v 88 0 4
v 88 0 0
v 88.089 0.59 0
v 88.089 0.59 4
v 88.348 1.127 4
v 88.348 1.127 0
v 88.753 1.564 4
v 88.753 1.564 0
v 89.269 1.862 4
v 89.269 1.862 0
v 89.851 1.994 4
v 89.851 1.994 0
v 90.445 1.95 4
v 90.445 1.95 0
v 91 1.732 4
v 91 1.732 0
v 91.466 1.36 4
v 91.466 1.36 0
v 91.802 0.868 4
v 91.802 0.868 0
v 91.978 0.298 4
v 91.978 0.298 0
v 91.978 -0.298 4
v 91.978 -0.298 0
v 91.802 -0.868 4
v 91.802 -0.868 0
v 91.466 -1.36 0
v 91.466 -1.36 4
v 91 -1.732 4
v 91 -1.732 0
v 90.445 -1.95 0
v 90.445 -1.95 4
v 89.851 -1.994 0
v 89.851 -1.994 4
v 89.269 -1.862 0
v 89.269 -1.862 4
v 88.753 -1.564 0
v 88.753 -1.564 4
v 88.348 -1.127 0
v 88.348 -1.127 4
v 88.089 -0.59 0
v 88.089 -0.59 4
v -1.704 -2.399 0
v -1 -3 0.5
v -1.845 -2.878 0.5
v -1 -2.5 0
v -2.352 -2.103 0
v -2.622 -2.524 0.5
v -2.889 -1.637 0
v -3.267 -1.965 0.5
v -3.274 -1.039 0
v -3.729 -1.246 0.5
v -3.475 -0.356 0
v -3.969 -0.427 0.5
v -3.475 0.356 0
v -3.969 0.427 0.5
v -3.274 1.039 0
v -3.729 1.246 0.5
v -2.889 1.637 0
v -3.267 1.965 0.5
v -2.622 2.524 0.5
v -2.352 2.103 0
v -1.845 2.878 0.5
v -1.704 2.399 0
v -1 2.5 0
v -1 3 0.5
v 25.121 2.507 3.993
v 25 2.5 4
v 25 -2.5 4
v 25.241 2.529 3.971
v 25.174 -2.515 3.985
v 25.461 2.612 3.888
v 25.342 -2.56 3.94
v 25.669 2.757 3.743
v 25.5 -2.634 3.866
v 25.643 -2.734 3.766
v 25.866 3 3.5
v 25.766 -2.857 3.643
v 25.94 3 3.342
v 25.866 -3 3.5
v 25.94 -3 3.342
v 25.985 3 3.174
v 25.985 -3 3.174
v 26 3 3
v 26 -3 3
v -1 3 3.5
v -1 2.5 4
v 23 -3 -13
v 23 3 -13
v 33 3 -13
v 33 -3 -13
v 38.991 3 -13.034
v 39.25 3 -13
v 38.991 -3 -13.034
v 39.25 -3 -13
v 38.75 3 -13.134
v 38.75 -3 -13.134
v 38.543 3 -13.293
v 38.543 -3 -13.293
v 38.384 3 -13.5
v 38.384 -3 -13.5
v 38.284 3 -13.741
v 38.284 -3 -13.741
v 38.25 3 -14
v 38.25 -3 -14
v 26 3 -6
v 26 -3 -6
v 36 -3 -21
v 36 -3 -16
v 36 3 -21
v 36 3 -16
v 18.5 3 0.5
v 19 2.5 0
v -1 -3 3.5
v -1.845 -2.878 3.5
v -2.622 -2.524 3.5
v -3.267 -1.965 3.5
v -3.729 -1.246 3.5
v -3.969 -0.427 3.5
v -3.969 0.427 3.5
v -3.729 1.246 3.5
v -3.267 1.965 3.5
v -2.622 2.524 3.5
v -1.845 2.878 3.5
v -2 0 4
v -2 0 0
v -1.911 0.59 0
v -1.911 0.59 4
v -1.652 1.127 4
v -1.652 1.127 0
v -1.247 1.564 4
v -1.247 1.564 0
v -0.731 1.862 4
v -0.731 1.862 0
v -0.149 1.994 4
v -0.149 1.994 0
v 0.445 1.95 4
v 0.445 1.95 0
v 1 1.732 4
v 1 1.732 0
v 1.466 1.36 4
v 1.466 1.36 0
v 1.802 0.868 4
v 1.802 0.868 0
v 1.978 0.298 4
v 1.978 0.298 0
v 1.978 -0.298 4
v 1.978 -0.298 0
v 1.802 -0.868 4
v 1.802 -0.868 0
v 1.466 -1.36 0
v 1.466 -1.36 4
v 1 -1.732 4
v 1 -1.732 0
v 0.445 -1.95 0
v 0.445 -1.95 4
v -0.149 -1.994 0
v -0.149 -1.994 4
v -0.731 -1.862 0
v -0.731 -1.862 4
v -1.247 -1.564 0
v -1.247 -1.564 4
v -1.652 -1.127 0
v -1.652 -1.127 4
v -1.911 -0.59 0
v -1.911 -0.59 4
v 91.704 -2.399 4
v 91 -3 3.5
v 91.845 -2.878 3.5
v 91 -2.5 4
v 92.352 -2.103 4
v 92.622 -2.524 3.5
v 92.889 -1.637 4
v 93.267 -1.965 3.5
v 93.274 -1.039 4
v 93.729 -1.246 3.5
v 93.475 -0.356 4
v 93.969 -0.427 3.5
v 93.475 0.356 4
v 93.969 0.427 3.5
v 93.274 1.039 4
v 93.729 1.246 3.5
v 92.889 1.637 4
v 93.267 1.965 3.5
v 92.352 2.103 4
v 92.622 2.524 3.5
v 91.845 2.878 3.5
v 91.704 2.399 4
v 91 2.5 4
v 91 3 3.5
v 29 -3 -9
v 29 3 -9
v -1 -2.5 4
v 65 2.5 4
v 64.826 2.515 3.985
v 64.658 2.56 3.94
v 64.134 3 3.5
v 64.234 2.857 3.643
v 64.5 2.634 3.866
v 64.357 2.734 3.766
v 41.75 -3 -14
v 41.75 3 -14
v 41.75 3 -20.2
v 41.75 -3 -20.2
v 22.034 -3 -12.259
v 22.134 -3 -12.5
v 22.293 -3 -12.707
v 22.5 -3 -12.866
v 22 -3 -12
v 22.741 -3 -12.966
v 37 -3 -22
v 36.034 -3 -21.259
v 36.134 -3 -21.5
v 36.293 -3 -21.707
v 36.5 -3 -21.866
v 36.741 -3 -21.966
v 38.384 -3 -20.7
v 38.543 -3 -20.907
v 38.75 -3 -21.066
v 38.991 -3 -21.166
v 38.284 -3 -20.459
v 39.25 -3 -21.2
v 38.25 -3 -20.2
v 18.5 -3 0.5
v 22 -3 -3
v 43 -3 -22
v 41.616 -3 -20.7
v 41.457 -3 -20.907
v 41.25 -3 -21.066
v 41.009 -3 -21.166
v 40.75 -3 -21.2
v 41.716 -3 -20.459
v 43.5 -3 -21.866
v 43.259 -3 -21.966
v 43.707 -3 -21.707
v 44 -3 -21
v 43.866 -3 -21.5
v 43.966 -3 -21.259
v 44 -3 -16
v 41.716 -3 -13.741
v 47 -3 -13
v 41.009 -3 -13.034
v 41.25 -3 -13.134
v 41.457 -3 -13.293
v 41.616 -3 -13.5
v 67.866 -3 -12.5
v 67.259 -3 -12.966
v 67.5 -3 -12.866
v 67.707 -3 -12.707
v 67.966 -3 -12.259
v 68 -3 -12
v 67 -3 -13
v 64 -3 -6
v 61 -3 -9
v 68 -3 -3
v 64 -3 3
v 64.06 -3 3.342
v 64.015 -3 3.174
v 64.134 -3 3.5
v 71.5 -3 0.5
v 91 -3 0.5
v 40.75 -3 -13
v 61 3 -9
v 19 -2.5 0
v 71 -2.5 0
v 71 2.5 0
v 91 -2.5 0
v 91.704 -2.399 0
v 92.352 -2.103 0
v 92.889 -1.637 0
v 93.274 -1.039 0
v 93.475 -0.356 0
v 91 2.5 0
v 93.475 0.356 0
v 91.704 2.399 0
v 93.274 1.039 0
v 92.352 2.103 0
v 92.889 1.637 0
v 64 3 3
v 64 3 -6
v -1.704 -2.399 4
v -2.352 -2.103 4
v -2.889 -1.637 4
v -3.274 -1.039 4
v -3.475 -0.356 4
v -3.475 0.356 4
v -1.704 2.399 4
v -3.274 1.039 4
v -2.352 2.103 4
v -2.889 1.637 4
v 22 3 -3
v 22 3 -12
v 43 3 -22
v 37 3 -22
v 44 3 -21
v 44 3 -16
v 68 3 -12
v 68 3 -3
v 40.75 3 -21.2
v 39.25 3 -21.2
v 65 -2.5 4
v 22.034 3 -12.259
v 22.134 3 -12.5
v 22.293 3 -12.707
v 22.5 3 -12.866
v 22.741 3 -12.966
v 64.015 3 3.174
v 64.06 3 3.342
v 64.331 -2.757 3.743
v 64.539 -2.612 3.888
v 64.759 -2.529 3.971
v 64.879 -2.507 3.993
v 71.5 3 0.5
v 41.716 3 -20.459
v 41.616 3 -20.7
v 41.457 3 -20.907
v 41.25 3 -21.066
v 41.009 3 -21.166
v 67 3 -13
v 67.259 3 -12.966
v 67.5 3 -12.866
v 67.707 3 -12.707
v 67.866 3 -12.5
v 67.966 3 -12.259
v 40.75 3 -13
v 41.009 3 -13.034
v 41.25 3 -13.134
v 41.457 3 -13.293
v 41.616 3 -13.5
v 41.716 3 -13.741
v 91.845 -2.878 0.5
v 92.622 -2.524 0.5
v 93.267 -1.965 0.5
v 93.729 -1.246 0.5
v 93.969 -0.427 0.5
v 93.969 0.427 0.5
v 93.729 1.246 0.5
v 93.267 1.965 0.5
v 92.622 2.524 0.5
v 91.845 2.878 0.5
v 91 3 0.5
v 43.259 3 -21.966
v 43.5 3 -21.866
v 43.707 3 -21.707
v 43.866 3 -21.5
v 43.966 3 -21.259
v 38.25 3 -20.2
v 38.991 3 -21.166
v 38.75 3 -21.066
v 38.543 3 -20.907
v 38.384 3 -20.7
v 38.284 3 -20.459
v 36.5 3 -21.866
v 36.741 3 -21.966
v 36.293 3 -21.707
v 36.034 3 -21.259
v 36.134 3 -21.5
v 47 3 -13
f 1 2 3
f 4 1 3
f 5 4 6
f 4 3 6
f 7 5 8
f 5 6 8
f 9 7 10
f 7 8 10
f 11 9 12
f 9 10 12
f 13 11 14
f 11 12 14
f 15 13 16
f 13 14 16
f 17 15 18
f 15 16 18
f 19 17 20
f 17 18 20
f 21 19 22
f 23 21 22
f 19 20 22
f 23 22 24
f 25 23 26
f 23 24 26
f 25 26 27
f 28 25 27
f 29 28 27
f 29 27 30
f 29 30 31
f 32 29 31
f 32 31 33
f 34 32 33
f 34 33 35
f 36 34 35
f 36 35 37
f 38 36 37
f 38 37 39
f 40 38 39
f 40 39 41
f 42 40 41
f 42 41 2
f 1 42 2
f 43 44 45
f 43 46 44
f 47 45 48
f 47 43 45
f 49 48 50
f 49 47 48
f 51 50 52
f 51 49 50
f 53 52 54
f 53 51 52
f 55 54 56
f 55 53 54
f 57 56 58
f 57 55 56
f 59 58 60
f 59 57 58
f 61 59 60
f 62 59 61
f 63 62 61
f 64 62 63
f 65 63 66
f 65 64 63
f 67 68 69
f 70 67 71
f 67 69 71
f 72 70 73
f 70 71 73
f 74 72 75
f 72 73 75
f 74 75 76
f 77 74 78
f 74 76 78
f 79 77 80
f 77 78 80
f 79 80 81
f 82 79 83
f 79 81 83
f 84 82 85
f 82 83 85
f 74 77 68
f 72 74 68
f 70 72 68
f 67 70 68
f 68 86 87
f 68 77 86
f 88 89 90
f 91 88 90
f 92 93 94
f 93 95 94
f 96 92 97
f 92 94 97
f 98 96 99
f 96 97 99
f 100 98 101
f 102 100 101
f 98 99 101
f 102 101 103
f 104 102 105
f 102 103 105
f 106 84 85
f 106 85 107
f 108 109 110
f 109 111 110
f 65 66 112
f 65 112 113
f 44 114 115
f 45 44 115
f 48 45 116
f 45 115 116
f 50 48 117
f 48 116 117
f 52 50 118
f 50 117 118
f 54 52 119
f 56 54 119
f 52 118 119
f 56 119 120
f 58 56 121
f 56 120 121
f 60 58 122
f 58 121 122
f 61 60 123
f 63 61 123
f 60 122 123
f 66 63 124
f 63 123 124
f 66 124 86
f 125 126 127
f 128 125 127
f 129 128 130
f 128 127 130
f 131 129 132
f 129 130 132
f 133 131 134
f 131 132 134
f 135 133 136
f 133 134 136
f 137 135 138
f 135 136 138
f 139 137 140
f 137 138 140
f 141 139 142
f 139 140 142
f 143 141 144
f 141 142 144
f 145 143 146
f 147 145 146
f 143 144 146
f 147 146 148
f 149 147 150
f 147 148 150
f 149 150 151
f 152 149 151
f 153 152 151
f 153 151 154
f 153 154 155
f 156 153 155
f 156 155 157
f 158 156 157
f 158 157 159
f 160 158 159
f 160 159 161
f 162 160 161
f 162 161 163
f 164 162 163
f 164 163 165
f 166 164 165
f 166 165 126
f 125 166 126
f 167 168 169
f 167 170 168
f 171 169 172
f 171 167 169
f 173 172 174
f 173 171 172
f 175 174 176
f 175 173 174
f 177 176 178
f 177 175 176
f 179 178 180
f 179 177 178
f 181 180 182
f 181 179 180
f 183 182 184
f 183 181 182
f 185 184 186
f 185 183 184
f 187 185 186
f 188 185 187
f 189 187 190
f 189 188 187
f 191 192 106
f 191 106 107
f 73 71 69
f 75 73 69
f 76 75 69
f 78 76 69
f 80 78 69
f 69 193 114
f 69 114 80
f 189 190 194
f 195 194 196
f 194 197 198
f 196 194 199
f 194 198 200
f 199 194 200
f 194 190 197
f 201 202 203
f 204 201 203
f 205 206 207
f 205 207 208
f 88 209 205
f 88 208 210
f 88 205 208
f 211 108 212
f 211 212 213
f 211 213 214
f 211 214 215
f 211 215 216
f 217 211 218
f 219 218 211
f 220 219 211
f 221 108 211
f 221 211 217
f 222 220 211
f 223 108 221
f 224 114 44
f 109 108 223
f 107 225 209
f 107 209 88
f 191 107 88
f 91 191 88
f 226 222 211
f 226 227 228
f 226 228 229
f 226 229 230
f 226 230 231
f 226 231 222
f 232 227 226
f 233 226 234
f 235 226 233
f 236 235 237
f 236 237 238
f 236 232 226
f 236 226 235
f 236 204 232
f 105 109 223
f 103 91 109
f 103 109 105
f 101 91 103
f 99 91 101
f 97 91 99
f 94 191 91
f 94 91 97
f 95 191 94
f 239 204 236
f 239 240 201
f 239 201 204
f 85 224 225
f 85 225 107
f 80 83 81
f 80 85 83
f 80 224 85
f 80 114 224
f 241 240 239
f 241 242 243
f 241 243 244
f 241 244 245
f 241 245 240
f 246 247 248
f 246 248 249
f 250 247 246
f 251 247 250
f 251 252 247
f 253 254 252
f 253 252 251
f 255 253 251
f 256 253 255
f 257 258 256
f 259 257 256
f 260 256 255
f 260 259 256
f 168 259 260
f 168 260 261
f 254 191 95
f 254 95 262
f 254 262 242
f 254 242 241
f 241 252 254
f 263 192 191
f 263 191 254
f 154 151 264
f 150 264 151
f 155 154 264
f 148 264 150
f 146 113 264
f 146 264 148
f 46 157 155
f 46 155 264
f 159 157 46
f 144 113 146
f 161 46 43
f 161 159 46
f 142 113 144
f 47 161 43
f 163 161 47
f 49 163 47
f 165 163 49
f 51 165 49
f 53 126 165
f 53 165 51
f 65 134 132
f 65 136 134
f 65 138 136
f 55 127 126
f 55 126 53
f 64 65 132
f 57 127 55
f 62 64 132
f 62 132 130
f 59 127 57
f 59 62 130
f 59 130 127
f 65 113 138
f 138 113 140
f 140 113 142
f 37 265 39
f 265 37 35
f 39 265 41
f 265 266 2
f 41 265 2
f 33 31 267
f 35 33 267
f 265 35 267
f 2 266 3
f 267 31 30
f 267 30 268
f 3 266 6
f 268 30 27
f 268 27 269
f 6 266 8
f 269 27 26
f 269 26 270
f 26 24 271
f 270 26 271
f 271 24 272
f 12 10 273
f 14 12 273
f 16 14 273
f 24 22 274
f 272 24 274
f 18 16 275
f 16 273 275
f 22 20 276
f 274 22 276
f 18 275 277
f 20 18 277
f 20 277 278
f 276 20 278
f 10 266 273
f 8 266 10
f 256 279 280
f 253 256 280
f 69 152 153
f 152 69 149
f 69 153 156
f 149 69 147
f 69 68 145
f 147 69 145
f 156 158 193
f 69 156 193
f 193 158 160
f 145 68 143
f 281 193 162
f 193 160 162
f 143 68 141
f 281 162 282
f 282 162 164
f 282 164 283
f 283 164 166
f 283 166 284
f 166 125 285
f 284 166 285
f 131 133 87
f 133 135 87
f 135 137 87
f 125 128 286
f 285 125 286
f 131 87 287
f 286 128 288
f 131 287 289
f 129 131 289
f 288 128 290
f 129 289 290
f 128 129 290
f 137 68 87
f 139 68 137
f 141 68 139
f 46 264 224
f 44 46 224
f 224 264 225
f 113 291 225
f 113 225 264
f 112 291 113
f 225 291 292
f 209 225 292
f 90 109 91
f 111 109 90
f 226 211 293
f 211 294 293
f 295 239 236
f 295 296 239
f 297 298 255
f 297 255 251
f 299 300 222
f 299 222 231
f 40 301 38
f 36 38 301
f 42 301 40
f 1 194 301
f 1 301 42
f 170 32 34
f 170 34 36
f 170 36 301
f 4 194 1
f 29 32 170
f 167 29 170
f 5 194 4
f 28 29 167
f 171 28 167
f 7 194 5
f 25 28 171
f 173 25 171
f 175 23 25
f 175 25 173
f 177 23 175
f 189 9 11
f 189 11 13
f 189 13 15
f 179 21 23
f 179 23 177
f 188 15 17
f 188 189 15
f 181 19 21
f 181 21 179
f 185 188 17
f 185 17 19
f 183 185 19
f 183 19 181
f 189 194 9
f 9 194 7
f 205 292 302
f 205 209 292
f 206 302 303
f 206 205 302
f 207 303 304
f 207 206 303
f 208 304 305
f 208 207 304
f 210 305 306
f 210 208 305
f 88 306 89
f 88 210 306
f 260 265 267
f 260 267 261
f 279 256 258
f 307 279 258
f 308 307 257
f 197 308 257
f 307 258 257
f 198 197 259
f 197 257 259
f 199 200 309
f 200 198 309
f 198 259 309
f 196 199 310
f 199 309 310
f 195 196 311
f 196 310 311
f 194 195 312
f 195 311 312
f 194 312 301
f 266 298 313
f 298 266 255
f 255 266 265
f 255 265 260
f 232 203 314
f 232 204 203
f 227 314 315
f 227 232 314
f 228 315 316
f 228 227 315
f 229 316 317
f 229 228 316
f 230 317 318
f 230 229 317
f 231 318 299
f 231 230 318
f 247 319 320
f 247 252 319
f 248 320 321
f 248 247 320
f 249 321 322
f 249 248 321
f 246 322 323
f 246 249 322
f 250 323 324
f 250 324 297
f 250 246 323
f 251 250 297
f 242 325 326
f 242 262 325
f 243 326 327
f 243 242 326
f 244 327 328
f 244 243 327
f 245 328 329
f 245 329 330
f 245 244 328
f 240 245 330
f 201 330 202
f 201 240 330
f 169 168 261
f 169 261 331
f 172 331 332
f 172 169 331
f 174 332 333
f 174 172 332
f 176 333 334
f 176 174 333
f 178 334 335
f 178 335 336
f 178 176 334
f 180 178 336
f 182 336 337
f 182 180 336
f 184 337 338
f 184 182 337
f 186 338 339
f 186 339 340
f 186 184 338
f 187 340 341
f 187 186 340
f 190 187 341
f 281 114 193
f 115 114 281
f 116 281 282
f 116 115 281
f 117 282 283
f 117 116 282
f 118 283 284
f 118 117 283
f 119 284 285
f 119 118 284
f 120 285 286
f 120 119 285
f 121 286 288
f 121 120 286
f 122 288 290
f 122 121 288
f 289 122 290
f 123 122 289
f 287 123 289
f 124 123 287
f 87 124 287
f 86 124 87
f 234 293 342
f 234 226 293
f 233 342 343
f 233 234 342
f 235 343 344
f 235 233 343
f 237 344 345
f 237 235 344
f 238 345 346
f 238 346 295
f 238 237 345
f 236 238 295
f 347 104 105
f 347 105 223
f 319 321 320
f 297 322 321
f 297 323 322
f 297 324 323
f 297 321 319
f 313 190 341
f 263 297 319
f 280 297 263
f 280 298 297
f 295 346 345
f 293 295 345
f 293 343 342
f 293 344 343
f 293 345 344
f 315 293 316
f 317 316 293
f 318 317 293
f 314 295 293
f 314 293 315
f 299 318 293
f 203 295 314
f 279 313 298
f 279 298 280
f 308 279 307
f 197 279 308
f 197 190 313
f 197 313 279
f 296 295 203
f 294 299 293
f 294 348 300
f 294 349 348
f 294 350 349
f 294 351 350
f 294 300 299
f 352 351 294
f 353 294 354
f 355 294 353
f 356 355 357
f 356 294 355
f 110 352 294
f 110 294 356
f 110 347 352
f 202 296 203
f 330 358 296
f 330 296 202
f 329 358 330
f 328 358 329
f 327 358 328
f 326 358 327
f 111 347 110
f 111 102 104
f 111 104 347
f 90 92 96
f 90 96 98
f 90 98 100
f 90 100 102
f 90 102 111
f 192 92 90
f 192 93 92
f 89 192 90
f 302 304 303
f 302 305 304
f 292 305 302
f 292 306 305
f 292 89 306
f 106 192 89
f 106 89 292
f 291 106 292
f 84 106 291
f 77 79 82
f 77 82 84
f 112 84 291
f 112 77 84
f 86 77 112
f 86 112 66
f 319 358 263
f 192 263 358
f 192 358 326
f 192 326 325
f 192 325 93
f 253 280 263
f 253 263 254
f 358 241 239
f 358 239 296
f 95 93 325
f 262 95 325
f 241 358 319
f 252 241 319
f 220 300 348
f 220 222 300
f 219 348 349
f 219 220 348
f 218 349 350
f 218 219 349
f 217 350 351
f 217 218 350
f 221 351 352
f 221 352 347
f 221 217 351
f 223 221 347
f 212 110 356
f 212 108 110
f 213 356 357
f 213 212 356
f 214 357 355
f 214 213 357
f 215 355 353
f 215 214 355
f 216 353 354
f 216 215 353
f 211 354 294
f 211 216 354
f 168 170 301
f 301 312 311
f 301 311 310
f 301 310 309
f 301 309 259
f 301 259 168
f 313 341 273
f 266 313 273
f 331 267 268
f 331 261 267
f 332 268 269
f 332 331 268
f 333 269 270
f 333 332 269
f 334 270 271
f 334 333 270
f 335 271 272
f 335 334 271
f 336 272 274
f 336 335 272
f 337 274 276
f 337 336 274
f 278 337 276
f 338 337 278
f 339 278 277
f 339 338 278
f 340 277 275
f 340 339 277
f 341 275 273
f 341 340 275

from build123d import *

# Parameters (mm, degrees)
CROQUIS1_R                = 3
SALIENTE_EXTRUIR1_DEPTH   = 4
SALIENTE_EXTRUIR1_2_DEPTH = 4
CROQUIS2_W                = 90
CROQUIS2_H                = 6
SALIENTE_EXTRUIR2_DEPTH   = 4
CROQUIS4_W                = 46
CROQUIS4_H                = 13
SALIENTE_EXTRUIR3_DEPTH   = 6
CROQUIS5_W                = 38
CROQUIS5_H                = 13
CORTAR_EXTRUIR1_DEPTH     = 95.09569597
CROQUIS6_W                = 8
CROQUIS6_H                = 9
SALIENTE_EXTRUIR4_DEPTH   = 3
CROQUIS7_W                = 3.5
CROQUIS7_H                = 8.2
CORTAR_EXTRUIR2_DEPTH     = 96.754895436
CHAFL_N1_SIZE             = 3
REDONDEO1_R               = 1
CROQUIS8_R                = 1.75
CORTAR_EXTRUIR3_DEPTH     = 97.612628574
SALIENTE_EXTRUIR5_DEPTH   = 4
CROQUIS10_R               = 2
CORTAR_EXTRUIR4_DEPTH     = 97.586748573
CHAFL_N2_SIZE             = 0.5


with BuildPart() as part:
    # Croquis1 → Saliente-Extruir1 (new body)
    with BuildSketch(Plane.XY):
        Circle(CROQUIS1_R)
    extrude(amount=SALIENTE_EXTRUIR1_DEPTH)



with BuildPart() as body_2:
    # Croquis1 → Saliente-Extruir1 2 (new body)
    with BuildSketch(Plane.XY):
        with Locations((90, 0)):
            Circle(CROQUIS1_R)
    extrude(amount=SALIENTE_EXTRUIR1_2_DEPTH)


with BuildPart() as part_1:
    add(part.part)

    add(body_2.part)  # Saliente-Extruir2 merges body 2
    # Croquis2 → Saliente-Extruir2 (add)
    with BuildSketch(Plane.XY):
        with Locations((45, 0)):
            Rectangle(CROQUIS2_W, CROQUIS2_H)
    extrude(amount=SALIENTE_EXTRUIR2_DEPTH)

    # Croquis4 → Saliente-Extruir3 (add)
    with BuildSketch(Plane(origin=(0, 3, 0), x_dir=(1, 0, 0), z_dir=(0, 1, 0))):
        with Locations((45, 6.5)):
            Rectangle(CROQUIS4_W, CROQUIS4_H)
    extrude(amount=-SALIENTE_EXTRUIR3_DEPTH)

    # Croquis5 → Cortar-Extruir1 (cut, through all)
    with BuildSketch(Plane(origin=(0, 3, 0), x_dir=(1, 0, 0), z_dir=(0, 1, 0))):
        with Locations((45, 2.5)):
            Rectangle(CROQUIS5_W, CROQUIS5_H)
    extrude(amount=-CORTAR_EXTRUIR1_DEPTH, mode=Mode.SUBTRACT)

    # Croquis6 → Saliente-Extruir4 (add, symmetric)
    with BuildSketch(Plane(origin=(0, 0, 0), x_dir=(1, 0, 0), z_dir=(0, 1, 0))):
        with Locations((40, 17.5)):
            Rectangle(CROQUIS6_W, CROQUIS6_H)
    extrude(amount=SALIENTE_EXTRUIR4_DEPTH, both=True)

    # Croquis7 → Cortar-Extruir2 (cut, through all)
    with BuildSketch(Plane(origin=(0, 3, 0), x_dir=(1, 0, 0), z_dir=(0, 1, 0))):
        with Locations((40, 17.1)):
            Rectangle(CROQUIS7_W, CROQUIS7_H)
    extrude(amount=-CORTAR_EXTRUIR2_DEPTH, mode=Mode.SUBTRACT)

    # Chaflán1
    chafl_n1_edges = [part_1.edges().sort_by_distance(p)[0] for p in [
        (22, 0, 0),
        (68, 0, 0),
        (26, 0, -9),
        (64, 0, -9),
        (36, 0, -13),
        (44, 0, -13),
    ]]
    chamfer(chafl_n1_edges, length=CHAFL_N1_SIZE)

    # Redondeo1
    redondeo1_edges = [part_1.edges().sort_by_distance(p)[0] for p in [
        (22, 0, -13),
        (68, 0, -13),
        (26, 0, 4),
        (64, 0, 4),
        (36, 0, -22),
        (44, 0, -22),
        (38.25, 0, -13),
        (38.25, 0, -21.2),
        (41.75, 0, -21.2),
        (41.75, 0, -13),
    ]]
    fillet(redondeo1_edges, radius=REDONDEO1_R)

    # Croquis8 → Cortar-Extruir3 (cut, through all)
    with BuildSketch(Plane.XY.offset(4)):
        Circle(CROQUIS8_R)
        with Locations((90, 0)):
            Circle(CROQUIS8_R)
    extrude(amount=-CORTAR_EXTRUIR3_DEPTH, mode=Mode.SUBTRACT)

    # Croquis9 → Saliente-Extruir5 (add)
    with BuildSketch(Plane.XY.offset(4)):
        with BuildLine():
            Line((-1, 3), (0, 3))
            Line((0, 3), (0, 2.5))
            ThreePointArc((0, 2.5), (-2.5, 0), (0, -2.5))
            Line((0, -2.5), (0, -3))
            Line((0, -3), (-1, -3))
            ThreePointArc((-1, -3), (-4, 0), (-1, 3))
        make_face()
    saliente_extruir5 = extrude(amount=-SALIENTE_EXTRUIR5_DEPTH)

    # Simetría1: Saliente-Extruir5 across plane
    add(saliente_extruir5.mirror(Plane(origin=(45, 0, 0), x_dir=(0, 0, 1), z_dir=(1, 0, 0))))

    # Croquis10 → Cortar-Extruir4 (cut, through all)
    with BuildSketch(Plane(origin=(0, 0, 0), x_dir=(-1, 0, 0), z_dir=(0, 0, -1))):
        Circle(CROQUIS10_R)
        with Locations((-90, 0)):
            Circle(CROQUIS10_R)
    extrude(amount=-CORTAR_EXTRUIR4_DEPTH, mode=Mode.SUBTRACT)

    # Chaflán2
    # the kernel refuses this chamfer: 0.5 mm, written as the material it takes off along each edge
    with BuildSketch(Plane(origin=(63.714158506, 3, 4), x_dir=(0, 0.027495876610586487, -0.9996219169112968), z_dir=(1, 0, 0)), Plane(origin=(-1, -3, 4), x_dir=(0, 0.9996219169112968, 0.027495876610585623), z_dir=(1, 0, 0)), Plane(origin=(-1, 3, 4), x_dir=(0, 0.027495876610590796, -0.9996219169112965), z_dir=(1, 0, 0)), Plane(origin=(63.714158506, -3, 4), x_dir=(0, 0.9996219169112968, 0.027495876610585623), z_dir=(1, 0, 0))) as chafl_n2_piece_1:
        Polygon((CHAFL_N2_SIZE * 0.999621916911, -CHAFL_N2_SIZE * 0.0274958766106), (-CHAFL_N2_SIZE * 0.0274958766106, -CHAFL_N2_SIZE * 0.999621916911), (0, 0), align=None)
    extrude(amount=27.285841494, mode=Mode.SUBTRACT)
    with BuildSketch(Plane(origin=(-1, 0, 0), x_dir=(0, -1, 0), z_dir=(1, 0, 0))) as chafl_n2_piece_2:
        Polygon((3, -CHAFL_N2_SIZE), (3 - CHAFL_N2_SIZE, 0), (3, 0), align=None)
    revolve(axis=Axis((-1, 0, 0), (0, 0, -1)), revolution_arc=180, mode=Mode.SUBTRACT)
    with BuildSketch(Plane(origin=(-1, 0, 4), x_dir=(0, -1, 0), z_dir=(1, 0, 0))) as chafl_n2_piece_3:
        Polygon((3 - CHAFL_N2_SIZE, 0), (3, CHAFL_N2_SIZE), (3, 0), align=None)
    revolve(axis=Axis((-1, 0, 4), (0, 0, -1)), revolution_arc=180, mode=Mode.SUBTRACT)
    with BuildSketch(Plane(origin=(91, 0, 4), x_dir=(0, -1, 0), z_dir=(-1, 0, 0))) as chafl_n2_piece_4:
        Polygon((3, -CHAFL_N2_SIZE), (3 - CHAFL_N2_SIZE, 0), (3, 0), align=None)
    revolve(axis=Axis((91, 0, 4), (0, 0, 1)), revolution_arc=180, mode=Mode.SUBTRACT)
    with BuildSketch(Plane(origin=(91, 0, 0), x_dir=(0, -1, 0), z_dir=(-1, 0, 0))) as chafl_n2_piece_5:
        Polygon((3 - CHAFL_N2_SIZE, 0), (3, CHAFL_N2_SIZE), (3, 0), align=None)
    revolve(axis=Axis((91, 0, 0), (0, 0, 1)), revolution_arc=180, mode=Mode.SUBTRACT)
    with BuildSketch(Plane(origin=(91, -3, 0), x_dir=(0, 0.9996219169112968, -0.027495876610586365), z_dir=(-1, 0, 0))) as chafl_n2_piece_6_section:
        Polygon((CHAFL_N2_SIZE * 0.999621916911, -CHAFL_N2_SIZE * 0.0274958766106), (-CHAFL_N2_SIZE * 0.0274958766106, -CHAFL_N2_SIZE * 0.999621916911), (0, 0), align=None)
    chafl_n2_piece_6 = extrude(amount=21.285841494, mode=Mode.PRIVATE)
    chafl_n2_piece_6 = split(chafl_n2_piece_6, bisect_by=Plane(origin=(80.80759364, -2.786891573, 9.80759364), z_dir=(0.7071067811865476, 0, -0.7071067811865476)), keep=Keep.TOP, mode=Mode.PRIVATE)
    add(chafl_n2_piece_6, mode=Mode.SUBTRACT)
    with BuildSketch(Plane(origin=(20.285841494, -3, 0), x_dir=(0, 0.9996219169112968, -0.027495876610586365), z_dir=(-1, 0, 0))) as chafl_n2_piece_7_section:
        Polygon((CHAFL_N2_SIZE * 0.999621916911, -CHAFL_N2_SIZE * 0.0274958766106), (-CHAFL_N2_SIZE * 0.0274958766106, -CHAFL_N2_SIZE * 0.999621916911), (0, 0), align=None)
    chafl_n2_piece_7 = extrude(amount=21.285841494, mode=Mode.PRIVATE)
    chafl_n2_piece_7 = split(chafl_n2_piece_7, bisect_by=Plane(origin=(14.099970333, -2.8351922, 4.900029667), z_dir=(-0.7071067811865476, 0, -0.7071067811865476)), keep=Keep.TOP, mode=Mode.PRIVATE)
    add(chafl_n2_piece_7, mode=Mode.SUBTRACT)
    with BuildSketch(Plane(origin=(20.285841494, 3, 0), x_dir=(0, 0.027495876610586494, 0.9996219169112968), z_dir=(-1, 0, 0))) as chafl_n2_piece_8_section:
        Polygon((CHAFL_N2_SIZE * 0.999621916911, -CHAFL_N2_SIZE * 0.0274958766106), (-CHAFL_N2_SIZE * 0.0274958766106, -CHAFL_N2_SIZE * 0.999621916911), (0, 0), align=None)
    chafl_n2_piece_8 = extrude(amount=21.285841494, mode=Mode.PRIVATE)
    chafl_n2_piece_8 = split(chafl_n2_piece_8, bisect_by=Plane(origin=(14.099970416, 2.835192201, 4.900029584), z_dir=(-0.7071067811865476, 0, -0.7071067811865476)), keep=Keep.TOP, mode=Mode.PRIVATE)
    add(chafl_n2_piece_8, mode=Mode.SUBTRACT)
    with BuildSketch(Plane(origin=(91, 3, 0), x_dir=(0, 0.027495876610590803, 0.9996219169112965), z_dir=(-1, 0, 0))) as chafl_n2_piece_9_section:
        Polygon((CHAFL_N2_SIZE * 0.999621916911, -CHAFL_N2_SIZE * 0.0274958766106), (-CHAFL_N2_SIZE * 0.0274958766106, -CHAFL_N2_SIZE * 0.999621916911), (0, 0), align=None)
    chafl_n2_piece_9 = extrude(amount=21.285841494, mode=Mode.PRIVATE)
    chafl_n2_piece_9 = split(chafl_n2_piece_9, bisect_by=Plane(origin=(75.900029584, 2.835192201, 4.900029584), z_dir=(0.7071067811865476, 0, -0.7071067811865476)), keep=Keep.TOP, mode=Mode.PRIVATE)
    add(chafl_n2_piece_9, mode=Mode.SUBTRACT)


solid = part_1.part
